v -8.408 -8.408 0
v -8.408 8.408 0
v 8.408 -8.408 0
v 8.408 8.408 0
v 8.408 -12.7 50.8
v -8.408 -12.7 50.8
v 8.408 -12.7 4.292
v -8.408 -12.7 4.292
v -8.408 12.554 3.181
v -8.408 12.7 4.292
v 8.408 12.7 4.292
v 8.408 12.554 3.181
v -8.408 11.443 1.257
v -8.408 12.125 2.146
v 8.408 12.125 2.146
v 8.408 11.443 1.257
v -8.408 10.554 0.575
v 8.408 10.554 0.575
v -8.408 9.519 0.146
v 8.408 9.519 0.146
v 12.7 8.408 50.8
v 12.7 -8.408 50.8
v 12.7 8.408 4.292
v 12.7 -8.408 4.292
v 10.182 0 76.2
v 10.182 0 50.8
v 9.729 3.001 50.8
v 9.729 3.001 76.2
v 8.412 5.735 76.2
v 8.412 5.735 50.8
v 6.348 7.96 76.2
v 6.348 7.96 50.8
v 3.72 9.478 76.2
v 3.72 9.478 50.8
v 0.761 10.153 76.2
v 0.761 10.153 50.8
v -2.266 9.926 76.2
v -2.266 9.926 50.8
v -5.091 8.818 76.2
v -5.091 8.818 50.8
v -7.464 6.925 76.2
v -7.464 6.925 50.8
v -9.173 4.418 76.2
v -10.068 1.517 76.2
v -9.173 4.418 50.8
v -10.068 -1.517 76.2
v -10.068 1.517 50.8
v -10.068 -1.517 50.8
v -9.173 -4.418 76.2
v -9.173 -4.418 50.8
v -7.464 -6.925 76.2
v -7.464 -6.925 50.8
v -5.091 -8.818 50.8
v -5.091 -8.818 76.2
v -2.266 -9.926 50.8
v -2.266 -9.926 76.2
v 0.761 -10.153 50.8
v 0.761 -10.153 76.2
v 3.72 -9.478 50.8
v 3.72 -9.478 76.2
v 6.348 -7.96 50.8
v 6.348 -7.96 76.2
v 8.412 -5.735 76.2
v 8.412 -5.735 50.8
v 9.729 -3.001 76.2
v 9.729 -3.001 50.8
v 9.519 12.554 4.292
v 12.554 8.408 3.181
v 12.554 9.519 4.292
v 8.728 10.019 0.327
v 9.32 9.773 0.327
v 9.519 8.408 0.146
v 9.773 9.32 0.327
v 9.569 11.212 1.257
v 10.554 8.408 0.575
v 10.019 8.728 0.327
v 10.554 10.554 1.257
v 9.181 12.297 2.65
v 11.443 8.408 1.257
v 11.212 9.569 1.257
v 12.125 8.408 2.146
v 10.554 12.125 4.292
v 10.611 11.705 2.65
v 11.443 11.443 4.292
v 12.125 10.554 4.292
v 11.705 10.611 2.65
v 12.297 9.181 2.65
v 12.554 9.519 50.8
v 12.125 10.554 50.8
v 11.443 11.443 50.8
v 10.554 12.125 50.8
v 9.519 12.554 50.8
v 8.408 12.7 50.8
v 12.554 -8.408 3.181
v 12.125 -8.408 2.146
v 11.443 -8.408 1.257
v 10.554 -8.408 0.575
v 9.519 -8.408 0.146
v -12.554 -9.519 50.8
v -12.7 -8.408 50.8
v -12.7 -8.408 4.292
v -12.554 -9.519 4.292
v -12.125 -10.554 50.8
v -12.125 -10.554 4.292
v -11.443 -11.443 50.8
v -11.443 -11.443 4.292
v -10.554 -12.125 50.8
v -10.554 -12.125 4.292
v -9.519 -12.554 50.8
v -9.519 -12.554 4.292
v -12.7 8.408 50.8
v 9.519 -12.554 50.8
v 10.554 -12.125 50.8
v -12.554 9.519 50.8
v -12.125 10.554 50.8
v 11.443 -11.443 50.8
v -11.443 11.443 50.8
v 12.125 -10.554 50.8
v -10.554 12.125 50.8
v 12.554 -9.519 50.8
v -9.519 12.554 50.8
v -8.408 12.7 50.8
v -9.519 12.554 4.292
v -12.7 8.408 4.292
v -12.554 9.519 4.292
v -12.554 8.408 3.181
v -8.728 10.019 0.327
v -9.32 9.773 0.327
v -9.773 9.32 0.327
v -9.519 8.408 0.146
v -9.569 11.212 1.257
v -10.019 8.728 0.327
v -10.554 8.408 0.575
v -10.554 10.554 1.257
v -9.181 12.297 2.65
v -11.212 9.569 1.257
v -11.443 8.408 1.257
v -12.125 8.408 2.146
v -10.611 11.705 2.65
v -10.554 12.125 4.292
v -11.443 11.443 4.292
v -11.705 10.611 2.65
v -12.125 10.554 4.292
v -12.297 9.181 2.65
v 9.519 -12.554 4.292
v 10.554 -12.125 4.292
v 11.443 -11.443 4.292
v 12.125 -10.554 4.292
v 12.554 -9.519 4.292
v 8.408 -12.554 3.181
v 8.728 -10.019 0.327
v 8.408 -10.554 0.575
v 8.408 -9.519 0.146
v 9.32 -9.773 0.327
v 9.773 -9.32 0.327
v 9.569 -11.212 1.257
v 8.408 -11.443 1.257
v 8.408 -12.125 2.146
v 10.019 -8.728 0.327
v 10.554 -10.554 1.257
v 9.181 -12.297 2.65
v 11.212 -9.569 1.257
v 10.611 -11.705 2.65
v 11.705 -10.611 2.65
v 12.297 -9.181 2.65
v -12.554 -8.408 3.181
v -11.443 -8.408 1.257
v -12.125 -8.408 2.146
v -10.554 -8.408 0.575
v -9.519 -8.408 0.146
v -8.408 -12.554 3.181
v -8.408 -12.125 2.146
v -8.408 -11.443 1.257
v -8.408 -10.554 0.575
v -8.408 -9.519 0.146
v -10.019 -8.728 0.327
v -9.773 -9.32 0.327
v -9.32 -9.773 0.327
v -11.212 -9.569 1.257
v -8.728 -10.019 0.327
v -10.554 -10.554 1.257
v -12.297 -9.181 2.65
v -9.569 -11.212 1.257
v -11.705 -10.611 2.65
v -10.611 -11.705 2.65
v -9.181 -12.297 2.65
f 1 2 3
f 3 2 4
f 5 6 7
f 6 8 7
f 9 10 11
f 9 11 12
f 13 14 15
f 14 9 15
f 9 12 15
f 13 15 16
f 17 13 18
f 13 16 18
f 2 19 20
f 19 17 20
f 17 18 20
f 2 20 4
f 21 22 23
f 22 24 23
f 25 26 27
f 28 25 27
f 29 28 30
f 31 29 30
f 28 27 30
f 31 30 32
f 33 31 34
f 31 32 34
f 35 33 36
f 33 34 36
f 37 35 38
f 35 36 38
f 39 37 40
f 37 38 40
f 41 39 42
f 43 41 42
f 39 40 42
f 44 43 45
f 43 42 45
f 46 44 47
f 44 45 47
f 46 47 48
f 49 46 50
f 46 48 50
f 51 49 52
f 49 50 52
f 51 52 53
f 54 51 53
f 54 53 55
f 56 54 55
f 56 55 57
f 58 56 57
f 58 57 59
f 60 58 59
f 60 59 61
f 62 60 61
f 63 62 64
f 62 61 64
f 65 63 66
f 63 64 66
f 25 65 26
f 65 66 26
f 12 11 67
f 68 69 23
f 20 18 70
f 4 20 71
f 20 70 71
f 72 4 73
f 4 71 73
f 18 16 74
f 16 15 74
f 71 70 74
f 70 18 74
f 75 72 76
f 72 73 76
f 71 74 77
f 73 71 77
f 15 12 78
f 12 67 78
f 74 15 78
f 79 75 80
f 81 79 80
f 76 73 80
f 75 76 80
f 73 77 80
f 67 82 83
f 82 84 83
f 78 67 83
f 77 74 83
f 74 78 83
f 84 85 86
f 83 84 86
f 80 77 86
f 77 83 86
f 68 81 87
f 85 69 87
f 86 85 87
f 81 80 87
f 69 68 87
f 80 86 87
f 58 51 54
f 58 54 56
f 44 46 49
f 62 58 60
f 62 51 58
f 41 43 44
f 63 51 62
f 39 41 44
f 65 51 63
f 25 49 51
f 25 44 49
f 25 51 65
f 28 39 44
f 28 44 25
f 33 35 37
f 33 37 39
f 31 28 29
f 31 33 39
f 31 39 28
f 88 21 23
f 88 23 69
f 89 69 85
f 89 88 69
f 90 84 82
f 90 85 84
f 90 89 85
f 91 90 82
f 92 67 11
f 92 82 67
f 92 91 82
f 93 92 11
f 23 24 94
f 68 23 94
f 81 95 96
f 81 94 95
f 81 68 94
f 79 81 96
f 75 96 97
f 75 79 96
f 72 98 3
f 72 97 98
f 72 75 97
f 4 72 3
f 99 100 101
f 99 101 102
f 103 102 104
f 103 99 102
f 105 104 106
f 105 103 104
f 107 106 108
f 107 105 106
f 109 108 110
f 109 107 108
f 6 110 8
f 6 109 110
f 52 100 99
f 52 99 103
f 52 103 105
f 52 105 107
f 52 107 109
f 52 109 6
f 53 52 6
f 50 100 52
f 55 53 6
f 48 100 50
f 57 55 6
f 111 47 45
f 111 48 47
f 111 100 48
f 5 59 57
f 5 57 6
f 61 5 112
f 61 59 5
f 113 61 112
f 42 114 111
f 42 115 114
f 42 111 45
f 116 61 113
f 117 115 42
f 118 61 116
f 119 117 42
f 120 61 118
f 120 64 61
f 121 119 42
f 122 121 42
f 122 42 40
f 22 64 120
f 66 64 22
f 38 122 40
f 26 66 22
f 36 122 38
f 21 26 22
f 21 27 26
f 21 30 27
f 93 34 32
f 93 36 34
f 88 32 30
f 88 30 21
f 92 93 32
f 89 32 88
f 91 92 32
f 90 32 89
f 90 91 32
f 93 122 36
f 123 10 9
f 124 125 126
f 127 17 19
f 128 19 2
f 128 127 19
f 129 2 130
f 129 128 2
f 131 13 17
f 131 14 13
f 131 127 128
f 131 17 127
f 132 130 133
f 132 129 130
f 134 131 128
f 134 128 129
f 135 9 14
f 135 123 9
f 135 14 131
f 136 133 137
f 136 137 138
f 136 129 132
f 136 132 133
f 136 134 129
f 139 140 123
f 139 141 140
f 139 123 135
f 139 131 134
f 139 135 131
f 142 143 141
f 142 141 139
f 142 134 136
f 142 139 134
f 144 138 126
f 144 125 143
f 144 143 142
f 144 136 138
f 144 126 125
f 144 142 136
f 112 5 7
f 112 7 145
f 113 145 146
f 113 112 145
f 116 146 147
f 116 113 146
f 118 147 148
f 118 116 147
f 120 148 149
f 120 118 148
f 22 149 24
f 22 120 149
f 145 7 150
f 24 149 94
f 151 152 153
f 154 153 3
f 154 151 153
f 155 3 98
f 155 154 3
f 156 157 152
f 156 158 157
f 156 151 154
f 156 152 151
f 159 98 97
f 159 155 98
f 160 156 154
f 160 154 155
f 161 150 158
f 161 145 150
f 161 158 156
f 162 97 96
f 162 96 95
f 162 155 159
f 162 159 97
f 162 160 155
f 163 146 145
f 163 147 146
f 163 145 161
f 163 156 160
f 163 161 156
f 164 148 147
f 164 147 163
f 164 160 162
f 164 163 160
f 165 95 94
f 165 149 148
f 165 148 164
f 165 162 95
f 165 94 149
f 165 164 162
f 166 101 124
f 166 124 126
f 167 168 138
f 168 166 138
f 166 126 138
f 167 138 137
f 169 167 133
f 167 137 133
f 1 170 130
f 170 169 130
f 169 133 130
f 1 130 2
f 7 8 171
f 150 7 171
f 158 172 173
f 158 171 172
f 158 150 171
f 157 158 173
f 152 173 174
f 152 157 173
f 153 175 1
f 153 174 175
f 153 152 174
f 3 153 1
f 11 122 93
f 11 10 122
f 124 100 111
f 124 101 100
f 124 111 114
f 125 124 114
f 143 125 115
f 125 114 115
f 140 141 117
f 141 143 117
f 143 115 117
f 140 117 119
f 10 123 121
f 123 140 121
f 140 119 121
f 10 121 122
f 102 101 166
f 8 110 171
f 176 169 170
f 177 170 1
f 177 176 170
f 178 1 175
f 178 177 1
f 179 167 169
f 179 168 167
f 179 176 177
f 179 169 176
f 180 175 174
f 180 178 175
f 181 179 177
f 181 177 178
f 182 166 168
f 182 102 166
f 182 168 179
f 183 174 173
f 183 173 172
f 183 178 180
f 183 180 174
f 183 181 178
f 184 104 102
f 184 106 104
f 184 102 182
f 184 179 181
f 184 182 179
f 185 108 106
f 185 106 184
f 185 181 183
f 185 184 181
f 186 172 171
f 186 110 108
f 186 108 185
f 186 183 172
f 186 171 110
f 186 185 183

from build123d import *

# Parameters (mm, degrees)
F0_W     = 25.4
F0_H     = 25.4
F1_DEPTH = 50.8
F2_R     = 4.292472
F3_R     = 10.181581
F4_DEPTH = 25.4


with BuildPart() as f1:
    # F0 (on Top) → F1 (new body)
    with BuildSketch(Plane.XY):
        Rectangle(F0_W, F0_H)
    extrude(amount=F1_DEPTH)

    # F2
    f2_edges = [f1.edges().sort_by_distance(p)[0] for p in [
        (12.7, -12.7, 25.4),
        (12.7, 12.7, 25.4),
        (-12.7, -12.7, 25.4),
        (-12.7, 12.7, 25.4),
        (0, 12.7, 0),
        (-12.7, 0, 0),
        (0, -12.7, 0),
        (12.7, 0, 0),
    ]]
    fillet(f2_edges, radius=F2_R)

    # F3 (on face) → F4 (join)
    with BuildSketch(Plane.XY.offset(50.8)):
        Circle(F3_R)
    extrude(amount=F4_DEPTH)


solid = f1.part
